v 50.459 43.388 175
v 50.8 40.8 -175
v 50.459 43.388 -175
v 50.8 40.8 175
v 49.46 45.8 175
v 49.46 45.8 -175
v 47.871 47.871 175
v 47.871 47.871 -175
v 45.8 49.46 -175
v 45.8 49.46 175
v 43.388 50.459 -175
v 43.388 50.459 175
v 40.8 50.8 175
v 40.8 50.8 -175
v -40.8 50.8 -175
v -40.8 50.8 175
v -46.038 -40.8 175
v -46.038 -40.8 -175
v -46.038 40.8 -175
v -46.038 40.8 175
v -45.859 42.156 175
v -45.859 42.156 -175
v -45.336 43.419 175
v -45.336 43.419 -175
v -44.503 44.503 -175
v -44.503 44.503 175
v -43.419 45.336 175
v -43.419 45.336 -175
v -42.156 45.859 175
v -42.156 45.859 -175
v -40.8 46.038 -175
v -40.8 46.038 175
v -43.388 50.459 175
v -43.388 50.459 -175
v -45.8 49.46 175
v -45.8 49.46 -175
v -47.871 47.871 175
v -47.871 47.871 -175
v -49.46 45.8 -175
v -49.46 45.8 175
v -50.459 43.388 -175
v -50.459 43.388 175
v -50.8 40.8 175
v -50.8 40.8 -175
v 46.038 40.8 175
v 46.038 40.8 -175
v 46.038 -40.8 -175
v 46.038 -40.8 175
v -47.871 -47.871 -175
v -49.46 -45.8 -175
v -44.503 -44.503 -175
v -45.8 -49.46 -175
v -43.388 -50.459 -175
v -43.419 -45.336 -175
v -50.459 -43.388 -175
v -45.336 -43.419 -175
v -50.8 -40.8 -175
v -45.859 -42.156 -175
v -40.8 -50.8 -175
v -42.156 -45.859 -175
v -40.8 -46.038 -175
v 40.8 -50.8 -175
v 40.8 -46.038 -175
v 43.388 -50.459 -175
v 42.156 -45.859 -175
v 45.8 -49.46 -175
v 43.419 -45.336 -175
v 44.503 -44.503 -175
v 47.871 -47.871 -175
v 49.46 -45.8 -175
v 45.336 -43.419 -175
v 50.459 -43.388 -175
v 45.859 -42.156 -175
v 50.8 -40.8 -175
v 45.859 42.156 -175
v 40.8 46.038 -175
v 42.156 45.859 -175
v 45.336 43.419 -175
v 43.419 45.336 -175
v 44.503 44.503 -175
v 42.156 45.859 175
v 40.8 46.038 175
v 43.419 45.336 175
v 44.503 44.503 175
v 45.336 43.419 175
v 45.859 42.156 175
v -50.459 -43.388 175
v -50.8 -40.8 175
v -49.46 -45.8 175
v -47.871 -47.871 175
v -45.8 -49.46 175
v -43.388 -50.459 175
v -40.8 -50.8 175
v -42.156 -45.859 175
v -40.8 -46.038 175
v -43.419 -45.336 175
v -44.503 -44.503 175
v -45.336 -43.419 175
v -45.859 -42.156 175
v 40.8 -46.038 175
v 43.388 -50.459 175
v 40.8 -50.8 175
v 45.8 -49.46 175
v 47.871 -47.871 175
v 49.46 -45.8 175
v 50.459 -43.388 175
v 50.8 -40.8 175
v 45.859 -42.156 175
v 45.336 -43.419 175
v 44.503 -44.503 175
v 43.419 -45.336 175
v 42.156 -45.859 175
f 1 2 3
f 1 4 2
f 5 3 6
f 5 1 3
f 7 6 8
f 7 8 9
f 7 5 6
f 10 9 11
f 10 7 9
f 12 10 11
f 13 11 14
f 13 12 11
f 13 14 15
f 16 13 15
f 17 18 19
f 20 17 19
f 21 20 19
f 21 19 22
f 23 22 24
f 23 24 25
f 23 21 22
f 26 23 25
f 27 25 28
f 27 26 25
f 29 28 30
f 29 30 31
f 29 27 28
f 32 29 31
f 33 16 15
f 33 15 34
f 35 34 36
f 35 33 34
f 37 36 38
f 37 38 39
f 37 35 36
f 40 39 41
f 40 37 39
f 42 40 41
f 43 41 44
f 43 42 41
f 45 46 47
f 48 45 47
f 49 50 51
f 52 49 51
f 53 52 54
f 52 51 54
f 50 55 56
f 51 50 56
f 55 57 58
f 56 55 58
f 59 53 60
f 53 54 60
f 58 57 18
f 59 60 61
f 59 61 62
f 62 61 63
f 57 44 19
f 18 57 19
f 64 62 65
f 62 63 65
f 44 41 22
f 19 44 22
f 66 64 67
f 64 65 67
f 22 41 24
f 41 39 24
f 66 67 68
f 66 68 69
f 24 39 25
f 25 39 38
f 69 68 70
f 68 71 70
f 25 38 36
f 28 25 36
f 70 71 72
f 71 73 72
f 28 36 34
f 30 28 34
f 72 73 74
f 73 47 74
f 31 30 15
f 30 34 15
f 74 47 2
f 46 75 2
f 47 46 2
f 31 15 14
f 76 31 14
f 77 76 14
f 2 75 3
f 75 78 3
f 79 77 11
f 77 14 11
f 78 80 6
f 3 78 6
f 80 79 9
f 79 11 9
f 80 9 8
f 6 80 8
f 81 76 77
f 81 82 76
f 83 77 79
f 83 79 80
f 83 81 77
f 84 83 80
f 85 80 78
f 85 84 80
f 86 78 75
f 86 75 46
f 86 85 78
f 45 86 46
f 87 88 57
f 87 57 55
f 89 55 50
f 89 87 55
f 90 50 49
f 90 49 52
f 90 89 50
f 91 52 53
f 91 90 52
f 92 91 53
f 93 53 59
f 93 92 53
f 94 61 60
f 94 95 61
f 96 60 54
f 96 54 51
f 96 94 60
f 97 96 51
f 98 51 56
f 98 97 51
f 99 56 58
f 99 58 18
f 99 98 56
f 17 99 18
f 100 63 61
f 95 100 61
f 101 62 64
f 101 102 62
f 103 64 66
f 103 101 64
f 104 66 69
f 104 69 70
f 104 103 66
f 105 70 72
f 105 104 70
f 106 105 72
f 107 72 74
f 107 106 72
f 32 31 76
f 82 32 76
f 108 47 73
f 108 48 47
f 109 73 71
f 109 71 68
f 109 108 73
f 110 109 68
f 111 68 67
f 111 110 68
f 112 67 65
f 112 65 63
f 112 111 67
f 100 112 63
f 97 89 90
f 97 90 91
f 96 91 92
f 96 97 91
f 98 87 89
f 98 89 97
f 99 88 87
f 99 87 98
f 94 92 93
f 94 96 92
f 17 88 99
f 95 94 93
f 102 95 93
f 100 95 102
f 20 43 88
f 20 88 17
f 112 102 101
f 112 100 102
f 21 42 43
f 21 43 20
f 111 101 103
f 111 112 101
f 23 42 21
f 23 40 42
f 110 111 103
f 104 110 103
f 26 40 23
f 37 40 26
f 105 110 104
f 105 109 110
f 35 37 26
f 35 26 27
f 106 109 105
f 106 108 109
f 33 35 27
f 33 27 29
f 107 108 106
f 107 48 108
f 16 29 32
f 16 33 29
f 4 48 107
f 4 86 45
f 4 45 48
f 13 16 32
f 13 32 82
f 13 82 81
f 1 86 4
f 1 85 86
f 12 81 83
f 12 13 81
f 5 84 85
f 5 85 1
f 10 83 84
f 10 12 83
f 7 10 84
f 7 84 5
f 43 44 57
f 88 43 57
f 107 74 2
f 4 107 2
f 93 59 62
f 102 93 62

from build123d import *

# Parameters (mm, degrees)
F1_DEPTH = 175


with BuildPart() as f1:
    # F0 (on Top) → F1 (new body, symmetric)
    with BuildSketch(Plane.XY):
        with BuildLine():
            Line((40.8, 50.8), (-40.8, 50.8))
            ThreePointArc((-40.8, 50.8), (-47.871068, 47.871068), (-50.8, 40.8))
            Line((-50.8, 40.8), (-50.8, -40.8))
            ThreePointArc((-50.8, -40.8), (-47.871068, -47.871068), (-40.8, -50.8))
            Line((-40.8, -50.8), (40.8, -50.8))
            ThreePointArc((40.8, -50.8), (47.871068, -47.871068), (50.8, -40.8))
            Line((50.8, -40.8), (50.8, 40.8))
            ThreePointArc((50.8, 40.8), (47.871068, 47.871068), (40.8, 50.8))
        make_face()
        with BuildLine():
            ThreePointArc((-46.0375, 40.8), (-44.503472, 44.503472), (-40.8, 46.0375))
            Line((-40.8, 46.0375), (40.8, 46.0375))
            ThreePointArc((40.8, 46.0375), (44.503472, 44.503472), (46.0375, 40.8))
            Line((46.0375, 40.8), (46.0375, -40.8))
            ThreePointArc((46.0375, -40.8), (44.503472, -44.503472), (40.8, -46.0375))
            Line((40.8, -46.0375), (-40.8, -46.0375))
            ThreePointArc((-40.8, -46.0375), (-44.503472, -44.503472), (-46.0375, -40.8))
            Line((-46.0375, -40.8), (-46.0375, 40.8))
        make_face(mode=Mode.SUBTRACT)
    extrude(amount=F1_DEPTH, both=True)


solid = f1.part
